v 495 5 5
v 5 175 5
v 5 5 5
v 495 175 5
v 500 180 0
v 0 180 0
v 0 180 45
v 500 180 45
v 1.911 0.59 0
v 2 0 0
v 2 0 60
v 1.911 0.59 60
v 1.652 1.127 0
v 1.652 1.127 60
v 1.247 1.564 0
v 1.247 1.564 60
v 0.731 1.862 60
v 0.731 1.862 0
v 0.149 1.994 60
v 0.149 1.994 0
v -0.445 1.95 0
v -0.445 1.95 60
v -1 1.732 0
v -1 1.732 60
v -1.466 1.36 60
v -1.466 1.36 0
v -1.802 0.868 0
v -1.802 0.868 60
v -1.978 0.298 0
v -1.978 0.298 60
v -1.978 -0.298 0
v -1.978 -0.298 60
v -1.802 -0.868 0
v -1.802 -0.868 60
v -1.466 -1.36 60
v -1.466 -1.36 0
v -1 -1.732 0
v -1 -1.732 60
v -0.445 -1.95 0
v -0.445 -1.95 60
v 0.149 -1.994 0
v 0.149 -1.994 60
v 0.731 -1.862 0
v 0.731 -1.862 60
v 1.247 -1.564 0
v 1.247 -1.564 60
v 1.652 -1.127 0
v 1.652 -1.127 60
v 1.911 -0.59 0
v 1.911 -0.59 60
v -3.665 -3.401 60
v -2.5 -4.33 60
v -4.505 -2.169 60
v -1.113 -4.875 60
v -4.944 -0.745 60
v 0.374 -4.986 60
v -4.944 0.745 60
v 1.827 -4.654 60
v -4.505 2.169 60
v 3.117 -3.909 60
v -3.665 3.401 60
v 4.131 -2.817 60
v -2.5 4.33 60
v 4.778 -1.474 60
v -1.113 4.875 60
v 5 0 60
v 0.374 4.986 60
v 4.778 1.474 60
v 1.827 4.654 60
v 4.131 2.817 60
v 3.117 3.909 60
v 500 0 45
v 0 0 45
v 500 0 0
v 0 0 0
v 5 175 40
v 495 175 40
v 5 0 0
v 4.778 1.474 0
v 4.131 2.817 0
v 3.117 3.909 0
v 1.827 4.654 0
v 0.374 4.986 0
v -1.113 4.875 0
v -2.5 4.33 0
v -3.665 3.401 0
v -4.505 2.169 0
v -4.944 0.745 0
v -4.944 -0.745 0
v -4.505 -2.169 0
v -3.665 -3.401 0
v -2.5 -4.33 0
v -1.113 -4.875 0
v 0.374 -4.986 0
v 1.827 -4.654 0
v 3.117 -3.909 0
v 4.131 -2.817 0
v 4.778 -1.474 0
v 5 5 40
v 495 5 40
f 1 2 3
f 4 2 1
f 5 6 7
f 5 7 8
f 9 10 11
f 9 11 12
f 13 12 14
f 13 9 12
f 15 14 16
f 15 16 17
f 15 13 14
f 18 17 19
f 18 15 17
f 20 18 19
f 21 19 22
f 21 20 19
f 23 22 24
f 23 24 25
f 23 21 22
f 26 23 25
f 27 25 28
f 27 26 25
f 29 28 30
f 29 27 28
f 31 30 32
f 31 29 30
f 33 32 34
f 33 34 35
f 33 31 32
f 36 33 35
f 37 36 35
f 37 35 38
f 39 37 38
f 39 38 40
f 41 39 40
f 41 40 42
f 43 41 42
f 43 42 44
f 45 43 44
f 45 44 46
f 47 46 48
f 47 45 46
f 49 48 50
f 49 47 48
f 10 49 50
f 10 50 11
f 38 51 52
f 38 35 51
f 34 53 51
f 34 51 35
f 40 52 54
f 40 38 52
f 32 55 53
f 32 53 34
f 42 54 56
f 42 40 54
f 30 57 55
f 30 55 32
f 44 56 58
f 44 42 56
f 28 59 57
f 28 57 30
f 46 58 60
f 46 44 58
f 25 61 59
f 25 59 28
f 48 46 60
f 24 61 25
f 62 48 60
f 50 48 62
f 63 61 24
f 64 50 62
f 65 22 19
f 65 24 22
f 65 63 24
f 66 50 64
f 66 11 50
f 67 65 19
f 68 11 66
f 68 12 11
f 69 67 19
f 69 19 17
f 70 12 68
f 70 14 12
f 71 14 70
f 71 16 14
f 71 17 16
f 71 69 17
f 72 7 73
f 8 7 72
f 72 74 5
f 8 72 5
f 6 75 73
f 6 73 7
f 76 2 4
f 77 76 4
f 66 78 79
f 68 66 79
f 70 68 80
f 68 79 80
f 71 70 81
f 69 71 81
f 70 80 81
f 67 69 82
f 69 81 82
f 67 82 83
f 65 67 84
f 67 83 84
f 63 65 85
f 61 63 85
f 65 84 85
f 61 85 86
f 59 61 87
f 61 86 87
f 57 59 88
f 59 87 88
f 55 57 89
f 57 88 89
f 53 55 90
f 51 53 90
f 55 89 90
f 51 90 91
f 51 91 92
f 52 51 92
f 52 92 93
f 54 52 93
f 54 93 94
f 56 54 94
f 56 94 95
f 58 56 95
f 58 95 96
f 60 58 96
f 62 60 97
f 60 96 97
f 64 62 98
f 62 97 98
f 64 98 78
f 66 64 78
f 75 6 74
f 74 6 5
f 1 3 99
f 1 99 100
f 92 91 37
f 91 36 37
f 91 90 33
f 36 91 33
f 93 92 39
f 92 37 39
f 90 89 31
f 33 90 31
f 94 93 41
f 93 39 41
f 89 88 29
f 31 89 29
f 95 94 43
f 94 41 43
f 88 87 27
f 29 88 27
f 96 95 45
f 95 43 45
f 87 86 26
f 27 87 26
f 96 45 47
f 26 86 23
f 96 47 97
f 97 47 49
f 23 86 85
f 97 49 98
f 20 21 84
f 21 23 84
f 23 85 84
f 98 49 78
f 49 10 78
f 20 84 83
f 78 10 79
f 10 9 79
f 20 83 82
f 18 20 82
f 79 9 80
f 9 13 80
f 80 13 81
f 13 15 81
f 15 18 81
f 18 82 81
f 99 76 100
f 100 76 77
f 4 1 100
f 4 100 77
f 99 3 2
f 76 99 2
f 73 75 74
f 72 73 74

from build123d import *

# Parameters (mm, degrees)
BOX001_W     = 490
BOX001_H     = 170
BOX001_DEPTH = 35
BOX_W        = 500
BOX_H        = 180
BOX_DEPTH    = 45
TUBE_R       = 5
TUBE_R_2     = 2
TUBE_DEPTH   = 60


with BuildPart() as cube001:
    # Box001 → Box001 (new body)
    with BuildSketch(Plane(origin=(5, 5, 5), x_dir=(1, 0, 0), z_dir=(0, 0, 1))):
        with Locations((245, 85)):
            Rectangle(BOX001_W, BOX001_H)
    extrude(amount=BOX001_DEPTH)


with BuildPart() as cut:
    # Box → Box (new body)
    with BuildSketch(Plane.XY):
        with Locations((250, 90)):
            Rectangle(BOX_W, BOX_H)
    extrude(amount=BOX_DEPTH)

    # Cut: cut Cube001
    add(cube001.part, mode=Mode.SUBTRACT)


with BuildPart() as tube:
    # Tube → Tube (new body)
    with BuildSketch(Plane.XY):
        Circle(TUBE_R)
        Circle(TUBE_R_2, mode=Mode.SUBTRACT)
    extrude(amount=TUBE_DEPTH)


solid = Compound([cut.part, tube.part])
